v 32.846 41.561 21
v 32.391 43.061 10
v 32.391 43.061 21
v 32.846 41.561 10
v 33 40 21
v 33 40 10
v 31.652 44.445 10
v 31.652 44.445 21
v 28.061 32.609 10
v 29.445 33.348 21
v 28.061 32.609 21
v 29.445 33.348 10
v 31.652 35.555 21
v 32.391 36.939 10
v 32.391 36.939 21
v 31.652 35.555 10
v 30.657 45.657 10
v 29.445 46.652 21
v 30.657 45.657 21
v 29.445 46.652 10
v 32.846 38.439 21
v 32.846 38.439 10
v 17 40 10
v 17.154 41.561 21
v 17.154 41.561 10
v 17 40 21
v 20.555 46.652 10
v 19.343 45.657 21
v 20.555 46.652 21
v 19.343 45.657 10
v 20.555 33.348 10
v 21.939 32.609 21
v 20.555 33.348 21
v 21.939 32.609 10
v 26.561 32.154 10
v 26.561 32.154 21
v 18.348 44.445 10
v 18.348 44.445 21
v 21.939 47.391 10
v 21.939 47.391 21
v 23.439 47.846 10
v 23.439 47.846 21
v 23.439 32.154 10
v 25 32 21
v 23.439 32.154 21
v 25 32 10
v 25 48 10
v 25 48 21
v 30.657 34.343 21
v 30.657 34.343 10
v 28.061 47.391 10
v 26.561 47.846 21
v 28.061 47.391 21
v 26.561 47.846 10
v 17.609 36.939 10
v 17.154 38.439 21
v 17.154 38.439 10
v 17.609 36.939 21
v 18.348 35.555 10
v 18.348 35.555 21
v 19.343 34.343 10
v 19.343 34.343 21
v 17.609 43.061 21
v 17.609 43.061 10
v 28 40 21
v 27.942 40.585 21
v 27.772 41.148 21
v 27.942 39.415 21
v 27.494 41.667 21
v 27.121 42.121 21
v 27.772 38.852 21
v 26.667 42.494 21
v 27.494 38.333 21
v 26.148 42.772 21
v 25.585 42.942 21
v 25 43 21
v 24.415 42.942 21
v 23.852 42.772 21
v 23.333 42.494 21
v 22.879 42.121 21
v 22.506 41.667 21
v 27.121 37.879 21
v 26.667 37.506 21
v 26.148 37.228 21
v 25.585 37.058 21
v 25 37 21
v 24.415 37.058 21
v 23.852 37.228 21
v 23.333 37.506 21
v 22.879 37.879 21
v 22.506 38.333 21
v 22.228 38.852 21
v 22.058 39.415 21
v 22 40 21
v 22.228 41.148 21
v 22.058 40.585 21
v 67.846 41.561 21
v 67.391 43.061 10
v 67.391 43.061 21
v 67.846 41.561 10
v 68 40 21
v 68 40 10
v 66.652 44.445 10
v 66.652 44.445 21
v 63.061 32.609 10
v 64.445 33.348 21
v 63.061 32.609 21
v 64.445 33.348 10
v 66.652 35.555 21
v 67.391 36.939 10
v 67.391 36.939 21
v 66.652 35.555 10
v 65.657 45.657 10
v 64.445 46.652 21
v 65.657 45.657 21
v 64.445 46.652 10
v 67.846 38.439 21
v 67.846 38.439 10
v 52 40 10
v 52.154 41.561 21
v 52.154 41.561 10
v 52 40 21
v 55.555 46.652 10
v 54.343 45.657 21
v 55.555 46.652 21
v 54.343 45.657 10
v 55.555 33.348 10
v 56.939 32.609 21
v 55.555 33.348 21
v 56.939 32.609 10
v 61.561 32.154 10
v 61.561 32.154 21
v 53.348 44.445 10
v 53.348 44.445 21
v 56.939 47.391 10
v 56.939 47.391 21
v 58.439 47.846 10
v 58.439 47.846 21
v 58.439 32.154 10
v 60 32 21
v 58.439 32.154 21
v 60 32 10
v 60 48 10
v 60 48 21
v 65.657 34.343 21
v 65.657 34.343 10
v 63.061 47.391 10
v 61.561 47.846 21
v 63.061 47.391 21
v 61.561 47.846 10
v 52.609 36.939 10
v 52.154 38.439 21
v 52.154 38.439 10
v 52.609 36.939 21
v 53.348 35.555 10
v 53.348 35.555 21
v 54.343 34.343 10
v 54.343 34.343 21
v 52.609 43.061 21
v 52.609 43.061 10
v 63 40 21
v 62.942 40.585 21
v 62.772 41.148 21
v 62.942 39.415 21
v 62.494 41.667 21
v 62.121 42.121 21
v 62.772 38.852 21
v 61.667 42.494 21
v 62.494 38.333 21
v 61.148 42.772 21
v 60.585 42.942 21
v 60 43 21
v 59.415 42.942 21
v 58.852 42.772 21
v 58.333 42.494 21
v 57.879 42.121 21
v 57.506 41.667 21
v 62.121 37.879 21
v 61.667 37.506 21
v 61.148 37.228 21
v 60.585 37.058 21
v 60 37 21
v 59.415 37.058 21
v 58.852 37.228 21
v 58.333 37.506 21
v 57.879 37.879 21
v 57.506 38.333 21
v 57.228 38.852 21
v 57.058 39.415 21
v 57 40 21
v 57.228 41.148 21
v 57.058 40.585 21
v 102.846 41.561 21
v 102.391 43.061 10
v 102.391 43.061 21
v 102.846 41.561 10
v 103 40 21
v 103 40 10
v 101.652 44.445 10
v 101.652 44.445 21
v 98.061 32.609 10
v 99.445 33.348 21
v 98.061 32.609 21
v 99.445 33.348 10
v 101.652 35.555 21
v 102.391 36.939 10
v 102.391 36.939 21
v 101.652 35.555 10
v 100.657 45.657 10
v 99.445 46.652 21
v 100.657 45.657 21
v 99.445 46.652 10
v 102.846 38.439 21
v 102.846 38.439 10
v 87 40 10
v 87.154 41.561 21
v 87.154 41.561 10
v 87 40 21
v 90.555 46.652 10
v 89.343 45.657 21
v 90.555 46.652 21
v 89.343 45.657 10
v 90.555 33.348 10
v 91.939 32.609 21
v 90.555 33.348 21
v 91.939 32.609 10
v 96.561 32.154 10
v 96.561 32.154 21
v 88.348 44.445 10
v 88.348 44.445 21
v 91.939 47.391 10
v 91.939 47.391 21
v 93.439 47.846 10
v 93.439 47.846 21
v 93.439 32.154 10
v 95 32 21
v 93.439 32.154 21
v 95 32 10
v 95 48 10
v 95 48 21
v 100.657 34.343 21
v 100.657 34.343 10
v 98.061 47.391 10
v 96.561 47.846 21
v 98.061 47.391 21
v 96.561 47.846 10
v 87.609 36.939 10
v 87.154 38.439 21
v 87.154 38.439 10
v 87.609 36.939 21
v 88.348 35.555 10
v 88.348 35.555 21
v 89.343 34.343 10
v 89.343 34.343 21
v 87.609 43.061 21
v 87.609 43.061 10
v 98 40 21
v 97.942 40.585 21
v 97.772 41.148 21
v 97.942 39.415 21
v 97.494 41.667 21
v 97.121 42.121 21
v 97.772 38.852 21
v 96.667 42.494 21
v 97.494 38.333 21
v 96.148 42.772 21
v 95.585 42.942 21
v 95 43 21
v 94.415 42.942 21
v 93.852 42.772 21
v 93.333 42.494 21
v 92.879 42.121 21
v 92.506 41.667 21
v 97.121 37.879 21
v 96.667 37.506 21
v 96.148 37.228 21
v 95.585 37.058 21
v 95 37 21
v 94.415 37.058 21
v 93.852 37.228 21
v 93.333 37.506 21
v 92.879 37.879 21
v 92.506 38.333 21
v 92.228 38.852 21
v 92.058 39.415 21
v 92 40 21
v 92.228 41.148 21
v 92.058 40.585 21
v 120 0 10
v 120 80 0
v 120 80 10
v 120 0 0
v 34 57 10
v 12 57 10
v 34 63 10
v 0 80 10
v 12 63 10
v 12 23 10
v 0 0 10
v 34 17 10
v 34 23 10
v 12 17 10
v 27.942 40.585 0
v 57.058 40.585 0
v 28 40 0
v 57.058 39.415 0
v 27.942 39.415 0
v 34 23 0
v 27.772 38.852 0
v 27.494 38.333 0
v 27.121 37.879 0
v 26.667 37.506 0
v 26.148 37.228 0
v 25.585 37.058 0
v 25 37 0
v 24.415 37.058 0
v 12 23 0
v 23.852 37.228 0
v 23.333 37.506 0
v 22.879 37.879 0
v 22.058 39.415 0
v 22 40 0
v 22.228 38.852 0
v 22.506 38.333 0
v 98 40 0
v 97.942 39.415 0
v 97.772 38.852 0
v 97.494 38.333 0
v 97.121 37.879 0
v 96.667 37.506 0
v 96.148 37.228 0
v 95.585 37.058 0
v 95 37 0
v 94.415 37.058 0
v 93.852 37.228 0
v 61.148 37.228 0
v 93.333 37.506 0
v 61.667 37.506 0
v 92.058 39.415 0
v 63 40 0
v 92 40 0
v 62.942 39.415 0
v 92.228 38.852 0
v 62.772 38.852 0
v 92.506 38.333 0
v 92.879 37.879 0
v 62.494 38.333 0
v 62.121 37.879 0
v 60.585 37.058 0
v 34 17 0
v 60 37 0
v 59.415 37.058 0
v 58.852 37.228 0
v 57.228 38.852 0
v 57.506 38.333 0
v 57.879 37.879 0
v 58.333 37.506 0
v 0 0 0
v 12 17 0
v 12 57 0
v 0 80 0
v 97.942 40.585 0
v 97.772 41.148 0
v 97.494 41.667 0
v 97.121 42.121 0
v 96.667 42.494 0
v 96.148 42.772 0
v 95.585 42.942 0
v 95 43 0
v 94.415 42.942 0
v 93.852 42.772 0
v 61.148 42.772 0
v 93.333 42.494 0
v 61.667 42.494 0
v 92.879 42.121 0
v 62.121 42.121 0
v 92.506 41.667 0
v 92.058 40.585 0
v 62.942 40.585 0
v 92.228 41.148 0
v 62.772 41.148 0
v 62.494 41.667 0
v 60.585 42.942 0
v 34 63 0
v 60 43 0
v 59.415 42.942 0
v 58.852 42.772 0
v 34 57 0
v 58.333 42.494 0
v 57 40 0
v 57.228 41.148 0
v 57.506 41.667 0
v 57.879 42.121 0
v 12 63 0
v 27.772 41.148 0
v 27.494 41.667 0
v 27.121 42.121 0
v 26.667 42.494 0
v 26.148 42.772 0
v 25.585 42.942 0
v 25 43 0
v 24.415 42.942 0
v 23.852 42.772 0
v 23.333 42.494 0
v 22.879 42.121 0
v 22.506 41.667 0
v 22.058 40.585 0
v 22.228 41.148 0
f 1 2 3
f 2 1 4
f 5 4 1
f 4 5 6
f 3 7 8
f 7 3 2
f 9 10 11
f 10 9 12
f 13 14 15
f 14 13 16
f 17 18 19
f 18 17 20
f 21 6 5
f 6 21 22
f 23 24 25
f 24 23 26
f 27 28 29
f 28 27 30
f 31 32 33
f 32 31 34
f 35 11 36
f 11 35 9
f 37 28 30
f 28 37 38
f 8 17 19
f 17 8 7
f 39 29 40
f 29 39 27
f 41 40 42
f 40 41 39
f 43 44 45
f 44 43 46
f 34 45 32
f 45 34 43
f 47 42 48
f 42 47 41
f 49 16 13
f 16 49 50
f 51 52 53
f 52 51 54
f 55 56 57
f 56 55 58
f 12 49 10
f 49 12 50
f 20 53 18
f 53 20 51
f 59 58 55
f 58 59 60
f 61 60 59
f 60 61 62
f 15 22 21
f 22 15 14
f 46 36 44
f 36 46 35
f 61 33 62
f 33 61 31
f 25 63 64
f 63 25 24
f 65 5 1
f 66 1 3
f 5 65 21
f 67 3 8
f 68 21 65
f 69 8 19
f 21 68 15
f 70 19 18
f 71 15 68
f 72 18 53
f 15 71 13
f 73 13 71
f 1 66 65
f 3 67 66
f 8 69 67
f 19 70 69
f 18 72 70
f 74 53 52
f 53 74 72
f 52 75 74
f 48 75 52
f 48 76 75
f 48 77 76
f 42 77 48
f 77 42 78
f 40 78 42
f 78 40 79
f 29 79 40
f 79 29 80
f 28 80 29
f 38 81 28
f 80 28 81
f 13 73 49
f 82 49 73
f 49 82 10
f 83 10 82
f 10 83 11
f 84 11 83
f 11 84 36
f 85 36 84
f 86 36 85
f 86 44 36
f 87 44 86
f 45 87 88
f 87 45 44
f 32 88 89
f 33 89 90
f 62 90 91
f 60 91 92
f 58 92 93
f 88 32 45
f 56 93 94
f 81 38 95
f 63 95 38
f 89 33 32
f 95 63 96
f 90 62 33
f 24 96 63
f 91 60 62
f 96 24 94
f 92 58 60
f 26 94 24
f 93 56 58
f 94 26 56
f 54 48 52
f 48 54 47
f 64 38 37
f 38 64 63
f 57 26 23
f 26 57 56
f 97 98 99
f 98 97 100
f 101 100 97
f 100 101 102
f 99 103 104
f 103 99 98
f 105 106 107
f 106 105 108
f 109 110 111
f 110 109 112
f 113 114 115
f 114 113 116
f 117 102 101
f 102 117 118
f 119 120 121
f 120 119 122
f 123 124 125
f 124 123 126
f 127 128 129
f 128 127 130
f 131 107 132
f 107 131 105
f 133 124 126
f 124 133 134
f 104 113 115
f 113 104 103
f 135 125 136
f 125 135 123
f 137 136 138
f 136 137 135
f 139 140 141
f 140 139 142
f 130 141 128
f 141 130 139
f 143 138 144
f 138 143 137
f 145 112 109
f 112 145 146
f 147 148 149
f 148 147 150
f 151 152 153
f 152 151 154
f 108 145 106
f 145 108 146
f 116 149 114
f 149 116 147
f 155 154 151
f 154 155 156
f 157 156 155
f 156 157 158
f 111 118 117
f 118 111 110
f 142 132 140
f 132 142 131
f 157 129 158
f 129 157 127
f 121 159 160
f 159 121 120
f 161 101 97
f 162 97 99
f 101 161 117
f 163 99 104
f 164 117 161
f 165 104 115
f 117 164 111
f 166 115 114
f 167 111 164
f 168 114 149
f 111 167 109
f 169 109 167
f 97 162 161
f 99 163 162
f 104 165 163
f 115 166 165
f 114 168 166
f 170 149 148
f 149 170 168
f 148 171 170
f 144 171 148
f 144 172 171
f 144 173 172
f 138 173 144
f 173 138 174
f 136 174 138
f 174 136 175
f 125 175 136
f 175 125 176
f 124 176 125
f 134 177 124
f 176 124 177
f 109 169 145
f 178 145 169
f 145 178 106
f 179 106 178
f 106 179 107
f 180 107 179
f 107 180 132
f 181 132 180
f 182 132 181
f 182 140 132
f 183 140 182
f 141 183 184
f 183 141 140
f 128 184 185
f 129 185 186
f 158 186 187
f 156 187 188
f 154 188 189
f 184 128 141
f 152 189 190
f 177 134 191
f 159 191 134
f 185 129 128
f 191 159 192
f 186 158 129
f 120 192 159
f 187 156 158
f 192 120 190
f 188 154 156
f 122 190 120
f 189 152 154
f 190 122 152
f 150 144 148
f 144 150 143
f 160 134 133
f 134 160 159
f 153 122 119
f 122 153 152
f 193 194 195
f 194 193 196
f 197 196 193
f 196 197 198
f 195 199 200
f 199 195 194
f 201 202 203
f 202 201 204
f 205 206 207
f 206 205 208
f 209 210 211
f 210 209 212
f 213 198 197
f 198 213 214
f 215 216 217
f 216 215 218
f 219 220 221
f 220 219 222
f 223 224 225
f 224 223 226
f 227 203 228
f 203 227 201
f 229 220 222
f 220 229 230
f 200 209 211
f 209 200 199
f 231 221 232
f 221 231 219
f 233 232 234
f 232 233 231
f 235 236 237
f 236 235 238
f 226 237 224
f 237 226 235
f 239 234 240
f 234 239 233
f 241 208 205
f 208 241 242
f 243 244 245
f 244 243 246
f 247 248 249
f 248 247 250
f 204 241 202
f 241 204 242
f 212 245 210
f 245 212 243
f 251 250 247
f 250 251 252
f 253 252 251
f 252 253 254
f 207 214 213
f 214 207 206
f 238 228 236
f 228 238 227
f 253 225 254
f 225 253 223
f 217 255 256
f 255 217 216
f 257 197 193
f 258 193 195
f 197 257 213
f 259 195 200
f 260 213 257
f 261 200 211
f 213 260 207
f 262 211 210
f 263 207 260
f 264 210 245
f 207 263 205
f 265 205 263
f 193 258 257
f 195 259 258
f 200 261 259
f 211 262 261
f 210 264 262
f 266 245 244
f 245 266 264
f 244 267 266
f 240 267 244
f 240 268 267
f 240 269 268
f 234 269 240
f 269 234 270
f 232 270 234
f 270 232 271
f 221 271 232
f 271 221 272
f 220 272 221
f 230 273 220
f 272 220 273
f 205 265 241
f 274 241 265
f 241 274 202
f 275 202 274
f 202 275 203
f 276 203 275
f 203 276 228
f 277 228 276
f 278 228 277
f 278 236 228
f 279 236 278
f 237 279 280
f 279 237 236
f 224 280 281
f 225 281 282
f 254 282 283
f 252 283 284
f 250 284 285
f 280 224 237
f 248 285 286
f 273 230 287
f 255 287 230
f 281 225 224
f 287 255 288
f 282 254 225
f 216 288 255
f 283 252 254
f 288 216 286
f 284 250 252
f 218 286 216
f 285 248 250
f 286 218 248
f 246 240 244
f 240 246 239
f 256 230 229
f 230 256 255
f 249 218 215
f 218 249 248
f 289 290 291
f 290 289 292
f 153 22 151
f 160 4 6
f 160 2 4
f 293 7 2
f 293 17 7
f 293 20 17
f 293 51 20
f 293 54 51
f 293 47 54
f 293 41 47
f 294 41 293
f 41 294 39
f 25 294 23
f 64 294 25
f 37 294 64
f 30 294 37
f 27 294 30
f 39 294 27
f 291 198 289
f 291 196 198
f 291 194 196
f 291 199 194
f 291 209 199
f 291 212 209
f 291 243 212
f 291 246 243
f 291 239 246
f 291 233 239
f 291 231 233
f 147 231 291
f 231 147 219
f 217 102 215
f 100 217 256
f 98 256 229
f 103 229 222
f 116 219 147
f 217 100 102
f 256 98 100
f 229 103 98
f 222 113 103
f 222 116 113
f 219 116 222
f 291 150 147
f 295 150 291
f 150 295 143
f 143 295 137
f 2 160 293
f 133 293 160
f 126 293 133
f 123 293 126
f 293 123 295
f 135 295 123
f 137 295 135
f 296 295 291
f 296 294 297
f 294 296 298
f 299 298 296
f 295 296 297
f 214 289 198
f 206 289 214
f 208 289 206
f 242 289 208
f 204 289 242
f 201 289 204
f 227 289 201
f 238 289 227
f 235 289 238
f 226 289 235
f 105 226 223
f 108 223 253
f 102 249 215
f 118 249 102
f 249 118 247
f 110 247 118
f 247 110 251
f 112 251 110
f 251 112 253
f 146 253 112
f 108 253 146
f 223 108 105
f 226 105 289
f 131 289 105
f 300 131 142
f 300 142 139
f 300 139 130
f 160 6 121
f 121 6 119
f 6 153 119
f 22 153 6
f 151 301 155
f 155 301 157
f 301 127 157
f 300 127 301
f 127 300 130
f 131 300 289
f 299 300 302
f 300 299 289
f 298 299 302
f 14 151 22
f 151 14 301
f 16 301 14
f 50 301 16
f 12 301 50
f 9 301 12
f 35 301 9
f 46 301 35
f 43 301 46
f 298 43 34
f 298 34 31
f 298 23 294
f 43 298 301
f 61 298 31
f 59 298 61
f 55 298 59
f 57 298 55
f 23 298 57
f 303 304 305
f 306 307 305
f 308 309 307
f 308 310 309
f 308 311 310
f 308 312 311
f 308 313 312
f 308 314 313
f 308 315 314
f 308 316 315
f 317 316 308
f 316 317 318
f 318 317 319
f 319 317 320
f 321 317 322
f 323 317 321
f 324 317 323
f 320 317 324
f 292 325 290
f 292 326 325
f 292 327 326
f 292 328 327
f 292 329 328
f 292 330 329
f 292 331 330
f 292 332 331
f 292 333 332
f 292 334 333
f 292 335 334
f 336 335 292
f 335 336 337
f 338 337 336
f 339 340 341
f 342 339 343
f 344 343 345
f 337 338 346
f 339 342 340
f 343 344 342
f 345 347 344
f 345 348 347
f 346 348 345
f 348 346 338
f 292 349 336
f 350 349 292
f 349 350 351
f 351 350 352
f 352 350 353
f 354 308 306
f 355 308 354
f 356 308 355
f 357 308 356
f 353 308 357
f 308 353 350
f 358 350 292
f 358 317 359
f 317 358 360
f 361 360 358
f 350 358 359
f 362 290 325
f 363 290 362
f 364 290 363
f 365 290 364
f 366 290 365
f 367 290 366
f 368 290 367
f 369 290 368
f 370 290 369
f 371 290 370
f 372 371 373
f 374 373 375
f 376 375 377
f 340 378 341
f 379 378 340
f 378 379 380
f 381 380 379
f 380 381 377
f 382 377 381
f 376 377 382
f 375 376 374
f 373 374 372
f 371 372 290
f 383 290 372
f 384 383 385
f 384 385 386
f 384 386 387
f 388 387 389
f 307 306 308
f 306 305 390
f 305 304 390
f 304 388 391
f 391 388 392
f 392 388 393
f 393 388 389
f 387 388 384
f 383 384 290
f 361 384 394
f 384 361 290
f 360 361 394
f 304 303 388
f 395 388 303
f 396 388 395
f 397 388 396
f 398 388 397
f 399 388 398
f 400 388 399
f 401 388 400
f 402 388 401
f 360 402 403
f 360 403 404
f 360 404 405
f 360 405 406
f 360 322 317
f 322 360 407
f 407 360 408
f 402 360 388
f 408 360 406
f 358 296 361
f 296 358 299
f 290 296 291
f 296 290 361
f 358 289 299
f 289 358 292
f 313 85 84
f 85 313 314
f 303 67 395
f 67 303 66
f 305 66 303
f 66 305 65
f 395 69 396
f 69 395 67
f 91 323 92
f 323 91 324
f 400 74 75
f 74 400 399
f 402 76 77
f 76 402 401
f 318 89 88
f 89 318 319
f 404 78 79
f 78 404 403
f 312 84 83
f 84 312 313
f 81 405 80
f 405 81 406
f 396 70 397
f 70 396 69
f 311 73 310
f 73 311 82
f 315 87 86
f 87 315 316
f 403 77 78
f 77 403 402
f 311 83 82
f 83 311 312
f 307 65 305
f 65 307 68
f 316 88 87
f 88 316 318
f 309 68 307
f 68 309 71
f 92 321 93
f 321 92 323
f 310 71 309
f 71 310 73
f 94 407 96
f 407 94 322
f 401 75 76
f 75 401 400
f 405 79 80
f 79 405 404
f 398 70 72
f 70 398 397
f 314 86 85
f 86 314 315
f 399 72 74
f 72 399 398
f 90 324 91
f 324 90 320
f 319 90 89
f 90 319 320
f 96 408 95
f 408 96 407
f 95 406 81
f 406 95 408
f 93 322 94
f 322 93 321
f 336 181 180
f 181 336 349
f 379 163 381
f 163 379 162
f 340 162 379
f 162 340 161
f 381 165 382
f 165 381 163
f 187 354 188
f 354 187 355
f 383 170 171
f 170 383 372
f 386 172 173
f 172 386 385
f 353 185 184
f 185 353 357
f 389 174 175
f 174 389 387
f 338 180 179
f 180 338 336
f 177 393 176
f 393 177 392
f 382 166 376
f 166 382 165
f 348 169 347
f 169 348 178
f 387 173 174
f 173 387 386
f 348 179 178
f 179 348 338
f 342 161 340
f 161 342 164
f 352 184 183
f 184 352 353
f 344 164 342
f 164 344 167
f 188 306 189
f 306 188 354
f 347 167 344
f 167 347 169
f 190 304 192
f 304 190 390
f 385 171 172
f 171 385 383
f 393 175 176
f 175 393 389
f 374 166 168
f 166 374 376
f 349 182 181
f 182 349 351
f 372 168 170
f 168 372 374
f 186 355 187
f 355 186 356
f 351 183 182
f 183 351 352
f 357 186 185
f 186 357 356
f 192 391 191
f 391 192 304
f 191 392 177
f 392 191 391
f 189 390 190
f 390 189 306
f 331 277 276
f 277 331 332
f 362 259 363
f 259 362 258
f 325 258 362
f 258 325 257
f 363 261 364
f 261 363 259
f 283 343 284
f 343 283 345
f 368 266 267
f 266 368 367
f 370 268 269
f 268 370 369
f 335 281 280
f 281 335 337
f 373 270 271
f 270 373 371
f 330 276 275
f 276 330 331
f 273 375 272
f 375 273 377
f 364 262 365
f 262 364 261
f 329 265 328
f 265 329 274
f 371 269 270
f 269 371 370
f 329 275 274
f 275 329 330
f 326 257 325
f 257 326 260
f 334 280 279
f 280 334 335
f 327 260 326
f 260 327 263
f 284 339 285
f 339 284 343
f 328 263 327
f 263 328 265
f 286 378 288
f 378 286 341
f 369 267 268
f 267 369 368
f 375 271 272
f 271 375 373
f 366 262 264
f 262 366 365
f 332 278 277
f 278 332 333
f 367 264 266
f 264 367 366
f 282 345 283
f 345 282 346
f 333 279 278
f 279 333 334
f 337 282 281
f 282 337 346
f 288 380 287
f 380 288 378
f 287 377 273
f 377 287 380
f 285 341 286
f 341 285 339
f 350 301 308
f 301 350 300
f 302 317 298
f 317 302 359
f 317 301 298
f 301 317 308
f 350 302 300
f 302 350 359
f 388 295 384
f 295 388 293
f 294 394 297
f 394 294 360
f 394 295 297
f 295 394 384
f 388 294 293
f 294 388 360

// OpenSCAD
$fn = 32;

// ----------------------------------------------------------------------
// Drill jig: three_boss_slot jig
// ----------------------------------------------------------------------

// --- parameters (mm) ---
plate_l = 120;            // plate length, X
plate_w = 80;             // plate width, Y
plate_t = 10;             // plate thickness
boss_d = 16;              // guide boss diameter
boss_h = 12;              // boss height above the plate
guide_d = 6;              // guide hole diameter
boss_pitch = 35;          // boss pitch
slot_w = 6;               // clamp slot width
slot_l = 22;              // clamp slot length
slot_x = 12;              // slot start X

n_boss = 3;  // guide bosses
boss_x0 = (plate_l - (n_boss - 1) * boss_pitch) / 2;  // first boss X
boss_top = plate_t - 1 + boss_h;  // boss crown height
total_h = boss_top;  // overall height

difference() {
  union() {
  cube([plate_l, plate_w, plate_t]);
  for (i = [0 : n_boss - 1])
    translate([boss_x0 + i * boss_pitch, plate_w / 2, plate_t - 1])
      cylinder(h = boss_h, d = boss_d);
  }
  for (i = [0 : n_boss - 1])
    translate([boss_x0 + i * boss_pitch, plate_w / 2, -1])
      cylinder(h = plate_t + boss_h, d = guide_d);
  for (cy = [plate_w * 0.25, plate_w * 0.75])
    translate([slot_x, cy - slot_w / 2, -1])
      cube([slot_l, slot_w, plate_t + 2]);
}
